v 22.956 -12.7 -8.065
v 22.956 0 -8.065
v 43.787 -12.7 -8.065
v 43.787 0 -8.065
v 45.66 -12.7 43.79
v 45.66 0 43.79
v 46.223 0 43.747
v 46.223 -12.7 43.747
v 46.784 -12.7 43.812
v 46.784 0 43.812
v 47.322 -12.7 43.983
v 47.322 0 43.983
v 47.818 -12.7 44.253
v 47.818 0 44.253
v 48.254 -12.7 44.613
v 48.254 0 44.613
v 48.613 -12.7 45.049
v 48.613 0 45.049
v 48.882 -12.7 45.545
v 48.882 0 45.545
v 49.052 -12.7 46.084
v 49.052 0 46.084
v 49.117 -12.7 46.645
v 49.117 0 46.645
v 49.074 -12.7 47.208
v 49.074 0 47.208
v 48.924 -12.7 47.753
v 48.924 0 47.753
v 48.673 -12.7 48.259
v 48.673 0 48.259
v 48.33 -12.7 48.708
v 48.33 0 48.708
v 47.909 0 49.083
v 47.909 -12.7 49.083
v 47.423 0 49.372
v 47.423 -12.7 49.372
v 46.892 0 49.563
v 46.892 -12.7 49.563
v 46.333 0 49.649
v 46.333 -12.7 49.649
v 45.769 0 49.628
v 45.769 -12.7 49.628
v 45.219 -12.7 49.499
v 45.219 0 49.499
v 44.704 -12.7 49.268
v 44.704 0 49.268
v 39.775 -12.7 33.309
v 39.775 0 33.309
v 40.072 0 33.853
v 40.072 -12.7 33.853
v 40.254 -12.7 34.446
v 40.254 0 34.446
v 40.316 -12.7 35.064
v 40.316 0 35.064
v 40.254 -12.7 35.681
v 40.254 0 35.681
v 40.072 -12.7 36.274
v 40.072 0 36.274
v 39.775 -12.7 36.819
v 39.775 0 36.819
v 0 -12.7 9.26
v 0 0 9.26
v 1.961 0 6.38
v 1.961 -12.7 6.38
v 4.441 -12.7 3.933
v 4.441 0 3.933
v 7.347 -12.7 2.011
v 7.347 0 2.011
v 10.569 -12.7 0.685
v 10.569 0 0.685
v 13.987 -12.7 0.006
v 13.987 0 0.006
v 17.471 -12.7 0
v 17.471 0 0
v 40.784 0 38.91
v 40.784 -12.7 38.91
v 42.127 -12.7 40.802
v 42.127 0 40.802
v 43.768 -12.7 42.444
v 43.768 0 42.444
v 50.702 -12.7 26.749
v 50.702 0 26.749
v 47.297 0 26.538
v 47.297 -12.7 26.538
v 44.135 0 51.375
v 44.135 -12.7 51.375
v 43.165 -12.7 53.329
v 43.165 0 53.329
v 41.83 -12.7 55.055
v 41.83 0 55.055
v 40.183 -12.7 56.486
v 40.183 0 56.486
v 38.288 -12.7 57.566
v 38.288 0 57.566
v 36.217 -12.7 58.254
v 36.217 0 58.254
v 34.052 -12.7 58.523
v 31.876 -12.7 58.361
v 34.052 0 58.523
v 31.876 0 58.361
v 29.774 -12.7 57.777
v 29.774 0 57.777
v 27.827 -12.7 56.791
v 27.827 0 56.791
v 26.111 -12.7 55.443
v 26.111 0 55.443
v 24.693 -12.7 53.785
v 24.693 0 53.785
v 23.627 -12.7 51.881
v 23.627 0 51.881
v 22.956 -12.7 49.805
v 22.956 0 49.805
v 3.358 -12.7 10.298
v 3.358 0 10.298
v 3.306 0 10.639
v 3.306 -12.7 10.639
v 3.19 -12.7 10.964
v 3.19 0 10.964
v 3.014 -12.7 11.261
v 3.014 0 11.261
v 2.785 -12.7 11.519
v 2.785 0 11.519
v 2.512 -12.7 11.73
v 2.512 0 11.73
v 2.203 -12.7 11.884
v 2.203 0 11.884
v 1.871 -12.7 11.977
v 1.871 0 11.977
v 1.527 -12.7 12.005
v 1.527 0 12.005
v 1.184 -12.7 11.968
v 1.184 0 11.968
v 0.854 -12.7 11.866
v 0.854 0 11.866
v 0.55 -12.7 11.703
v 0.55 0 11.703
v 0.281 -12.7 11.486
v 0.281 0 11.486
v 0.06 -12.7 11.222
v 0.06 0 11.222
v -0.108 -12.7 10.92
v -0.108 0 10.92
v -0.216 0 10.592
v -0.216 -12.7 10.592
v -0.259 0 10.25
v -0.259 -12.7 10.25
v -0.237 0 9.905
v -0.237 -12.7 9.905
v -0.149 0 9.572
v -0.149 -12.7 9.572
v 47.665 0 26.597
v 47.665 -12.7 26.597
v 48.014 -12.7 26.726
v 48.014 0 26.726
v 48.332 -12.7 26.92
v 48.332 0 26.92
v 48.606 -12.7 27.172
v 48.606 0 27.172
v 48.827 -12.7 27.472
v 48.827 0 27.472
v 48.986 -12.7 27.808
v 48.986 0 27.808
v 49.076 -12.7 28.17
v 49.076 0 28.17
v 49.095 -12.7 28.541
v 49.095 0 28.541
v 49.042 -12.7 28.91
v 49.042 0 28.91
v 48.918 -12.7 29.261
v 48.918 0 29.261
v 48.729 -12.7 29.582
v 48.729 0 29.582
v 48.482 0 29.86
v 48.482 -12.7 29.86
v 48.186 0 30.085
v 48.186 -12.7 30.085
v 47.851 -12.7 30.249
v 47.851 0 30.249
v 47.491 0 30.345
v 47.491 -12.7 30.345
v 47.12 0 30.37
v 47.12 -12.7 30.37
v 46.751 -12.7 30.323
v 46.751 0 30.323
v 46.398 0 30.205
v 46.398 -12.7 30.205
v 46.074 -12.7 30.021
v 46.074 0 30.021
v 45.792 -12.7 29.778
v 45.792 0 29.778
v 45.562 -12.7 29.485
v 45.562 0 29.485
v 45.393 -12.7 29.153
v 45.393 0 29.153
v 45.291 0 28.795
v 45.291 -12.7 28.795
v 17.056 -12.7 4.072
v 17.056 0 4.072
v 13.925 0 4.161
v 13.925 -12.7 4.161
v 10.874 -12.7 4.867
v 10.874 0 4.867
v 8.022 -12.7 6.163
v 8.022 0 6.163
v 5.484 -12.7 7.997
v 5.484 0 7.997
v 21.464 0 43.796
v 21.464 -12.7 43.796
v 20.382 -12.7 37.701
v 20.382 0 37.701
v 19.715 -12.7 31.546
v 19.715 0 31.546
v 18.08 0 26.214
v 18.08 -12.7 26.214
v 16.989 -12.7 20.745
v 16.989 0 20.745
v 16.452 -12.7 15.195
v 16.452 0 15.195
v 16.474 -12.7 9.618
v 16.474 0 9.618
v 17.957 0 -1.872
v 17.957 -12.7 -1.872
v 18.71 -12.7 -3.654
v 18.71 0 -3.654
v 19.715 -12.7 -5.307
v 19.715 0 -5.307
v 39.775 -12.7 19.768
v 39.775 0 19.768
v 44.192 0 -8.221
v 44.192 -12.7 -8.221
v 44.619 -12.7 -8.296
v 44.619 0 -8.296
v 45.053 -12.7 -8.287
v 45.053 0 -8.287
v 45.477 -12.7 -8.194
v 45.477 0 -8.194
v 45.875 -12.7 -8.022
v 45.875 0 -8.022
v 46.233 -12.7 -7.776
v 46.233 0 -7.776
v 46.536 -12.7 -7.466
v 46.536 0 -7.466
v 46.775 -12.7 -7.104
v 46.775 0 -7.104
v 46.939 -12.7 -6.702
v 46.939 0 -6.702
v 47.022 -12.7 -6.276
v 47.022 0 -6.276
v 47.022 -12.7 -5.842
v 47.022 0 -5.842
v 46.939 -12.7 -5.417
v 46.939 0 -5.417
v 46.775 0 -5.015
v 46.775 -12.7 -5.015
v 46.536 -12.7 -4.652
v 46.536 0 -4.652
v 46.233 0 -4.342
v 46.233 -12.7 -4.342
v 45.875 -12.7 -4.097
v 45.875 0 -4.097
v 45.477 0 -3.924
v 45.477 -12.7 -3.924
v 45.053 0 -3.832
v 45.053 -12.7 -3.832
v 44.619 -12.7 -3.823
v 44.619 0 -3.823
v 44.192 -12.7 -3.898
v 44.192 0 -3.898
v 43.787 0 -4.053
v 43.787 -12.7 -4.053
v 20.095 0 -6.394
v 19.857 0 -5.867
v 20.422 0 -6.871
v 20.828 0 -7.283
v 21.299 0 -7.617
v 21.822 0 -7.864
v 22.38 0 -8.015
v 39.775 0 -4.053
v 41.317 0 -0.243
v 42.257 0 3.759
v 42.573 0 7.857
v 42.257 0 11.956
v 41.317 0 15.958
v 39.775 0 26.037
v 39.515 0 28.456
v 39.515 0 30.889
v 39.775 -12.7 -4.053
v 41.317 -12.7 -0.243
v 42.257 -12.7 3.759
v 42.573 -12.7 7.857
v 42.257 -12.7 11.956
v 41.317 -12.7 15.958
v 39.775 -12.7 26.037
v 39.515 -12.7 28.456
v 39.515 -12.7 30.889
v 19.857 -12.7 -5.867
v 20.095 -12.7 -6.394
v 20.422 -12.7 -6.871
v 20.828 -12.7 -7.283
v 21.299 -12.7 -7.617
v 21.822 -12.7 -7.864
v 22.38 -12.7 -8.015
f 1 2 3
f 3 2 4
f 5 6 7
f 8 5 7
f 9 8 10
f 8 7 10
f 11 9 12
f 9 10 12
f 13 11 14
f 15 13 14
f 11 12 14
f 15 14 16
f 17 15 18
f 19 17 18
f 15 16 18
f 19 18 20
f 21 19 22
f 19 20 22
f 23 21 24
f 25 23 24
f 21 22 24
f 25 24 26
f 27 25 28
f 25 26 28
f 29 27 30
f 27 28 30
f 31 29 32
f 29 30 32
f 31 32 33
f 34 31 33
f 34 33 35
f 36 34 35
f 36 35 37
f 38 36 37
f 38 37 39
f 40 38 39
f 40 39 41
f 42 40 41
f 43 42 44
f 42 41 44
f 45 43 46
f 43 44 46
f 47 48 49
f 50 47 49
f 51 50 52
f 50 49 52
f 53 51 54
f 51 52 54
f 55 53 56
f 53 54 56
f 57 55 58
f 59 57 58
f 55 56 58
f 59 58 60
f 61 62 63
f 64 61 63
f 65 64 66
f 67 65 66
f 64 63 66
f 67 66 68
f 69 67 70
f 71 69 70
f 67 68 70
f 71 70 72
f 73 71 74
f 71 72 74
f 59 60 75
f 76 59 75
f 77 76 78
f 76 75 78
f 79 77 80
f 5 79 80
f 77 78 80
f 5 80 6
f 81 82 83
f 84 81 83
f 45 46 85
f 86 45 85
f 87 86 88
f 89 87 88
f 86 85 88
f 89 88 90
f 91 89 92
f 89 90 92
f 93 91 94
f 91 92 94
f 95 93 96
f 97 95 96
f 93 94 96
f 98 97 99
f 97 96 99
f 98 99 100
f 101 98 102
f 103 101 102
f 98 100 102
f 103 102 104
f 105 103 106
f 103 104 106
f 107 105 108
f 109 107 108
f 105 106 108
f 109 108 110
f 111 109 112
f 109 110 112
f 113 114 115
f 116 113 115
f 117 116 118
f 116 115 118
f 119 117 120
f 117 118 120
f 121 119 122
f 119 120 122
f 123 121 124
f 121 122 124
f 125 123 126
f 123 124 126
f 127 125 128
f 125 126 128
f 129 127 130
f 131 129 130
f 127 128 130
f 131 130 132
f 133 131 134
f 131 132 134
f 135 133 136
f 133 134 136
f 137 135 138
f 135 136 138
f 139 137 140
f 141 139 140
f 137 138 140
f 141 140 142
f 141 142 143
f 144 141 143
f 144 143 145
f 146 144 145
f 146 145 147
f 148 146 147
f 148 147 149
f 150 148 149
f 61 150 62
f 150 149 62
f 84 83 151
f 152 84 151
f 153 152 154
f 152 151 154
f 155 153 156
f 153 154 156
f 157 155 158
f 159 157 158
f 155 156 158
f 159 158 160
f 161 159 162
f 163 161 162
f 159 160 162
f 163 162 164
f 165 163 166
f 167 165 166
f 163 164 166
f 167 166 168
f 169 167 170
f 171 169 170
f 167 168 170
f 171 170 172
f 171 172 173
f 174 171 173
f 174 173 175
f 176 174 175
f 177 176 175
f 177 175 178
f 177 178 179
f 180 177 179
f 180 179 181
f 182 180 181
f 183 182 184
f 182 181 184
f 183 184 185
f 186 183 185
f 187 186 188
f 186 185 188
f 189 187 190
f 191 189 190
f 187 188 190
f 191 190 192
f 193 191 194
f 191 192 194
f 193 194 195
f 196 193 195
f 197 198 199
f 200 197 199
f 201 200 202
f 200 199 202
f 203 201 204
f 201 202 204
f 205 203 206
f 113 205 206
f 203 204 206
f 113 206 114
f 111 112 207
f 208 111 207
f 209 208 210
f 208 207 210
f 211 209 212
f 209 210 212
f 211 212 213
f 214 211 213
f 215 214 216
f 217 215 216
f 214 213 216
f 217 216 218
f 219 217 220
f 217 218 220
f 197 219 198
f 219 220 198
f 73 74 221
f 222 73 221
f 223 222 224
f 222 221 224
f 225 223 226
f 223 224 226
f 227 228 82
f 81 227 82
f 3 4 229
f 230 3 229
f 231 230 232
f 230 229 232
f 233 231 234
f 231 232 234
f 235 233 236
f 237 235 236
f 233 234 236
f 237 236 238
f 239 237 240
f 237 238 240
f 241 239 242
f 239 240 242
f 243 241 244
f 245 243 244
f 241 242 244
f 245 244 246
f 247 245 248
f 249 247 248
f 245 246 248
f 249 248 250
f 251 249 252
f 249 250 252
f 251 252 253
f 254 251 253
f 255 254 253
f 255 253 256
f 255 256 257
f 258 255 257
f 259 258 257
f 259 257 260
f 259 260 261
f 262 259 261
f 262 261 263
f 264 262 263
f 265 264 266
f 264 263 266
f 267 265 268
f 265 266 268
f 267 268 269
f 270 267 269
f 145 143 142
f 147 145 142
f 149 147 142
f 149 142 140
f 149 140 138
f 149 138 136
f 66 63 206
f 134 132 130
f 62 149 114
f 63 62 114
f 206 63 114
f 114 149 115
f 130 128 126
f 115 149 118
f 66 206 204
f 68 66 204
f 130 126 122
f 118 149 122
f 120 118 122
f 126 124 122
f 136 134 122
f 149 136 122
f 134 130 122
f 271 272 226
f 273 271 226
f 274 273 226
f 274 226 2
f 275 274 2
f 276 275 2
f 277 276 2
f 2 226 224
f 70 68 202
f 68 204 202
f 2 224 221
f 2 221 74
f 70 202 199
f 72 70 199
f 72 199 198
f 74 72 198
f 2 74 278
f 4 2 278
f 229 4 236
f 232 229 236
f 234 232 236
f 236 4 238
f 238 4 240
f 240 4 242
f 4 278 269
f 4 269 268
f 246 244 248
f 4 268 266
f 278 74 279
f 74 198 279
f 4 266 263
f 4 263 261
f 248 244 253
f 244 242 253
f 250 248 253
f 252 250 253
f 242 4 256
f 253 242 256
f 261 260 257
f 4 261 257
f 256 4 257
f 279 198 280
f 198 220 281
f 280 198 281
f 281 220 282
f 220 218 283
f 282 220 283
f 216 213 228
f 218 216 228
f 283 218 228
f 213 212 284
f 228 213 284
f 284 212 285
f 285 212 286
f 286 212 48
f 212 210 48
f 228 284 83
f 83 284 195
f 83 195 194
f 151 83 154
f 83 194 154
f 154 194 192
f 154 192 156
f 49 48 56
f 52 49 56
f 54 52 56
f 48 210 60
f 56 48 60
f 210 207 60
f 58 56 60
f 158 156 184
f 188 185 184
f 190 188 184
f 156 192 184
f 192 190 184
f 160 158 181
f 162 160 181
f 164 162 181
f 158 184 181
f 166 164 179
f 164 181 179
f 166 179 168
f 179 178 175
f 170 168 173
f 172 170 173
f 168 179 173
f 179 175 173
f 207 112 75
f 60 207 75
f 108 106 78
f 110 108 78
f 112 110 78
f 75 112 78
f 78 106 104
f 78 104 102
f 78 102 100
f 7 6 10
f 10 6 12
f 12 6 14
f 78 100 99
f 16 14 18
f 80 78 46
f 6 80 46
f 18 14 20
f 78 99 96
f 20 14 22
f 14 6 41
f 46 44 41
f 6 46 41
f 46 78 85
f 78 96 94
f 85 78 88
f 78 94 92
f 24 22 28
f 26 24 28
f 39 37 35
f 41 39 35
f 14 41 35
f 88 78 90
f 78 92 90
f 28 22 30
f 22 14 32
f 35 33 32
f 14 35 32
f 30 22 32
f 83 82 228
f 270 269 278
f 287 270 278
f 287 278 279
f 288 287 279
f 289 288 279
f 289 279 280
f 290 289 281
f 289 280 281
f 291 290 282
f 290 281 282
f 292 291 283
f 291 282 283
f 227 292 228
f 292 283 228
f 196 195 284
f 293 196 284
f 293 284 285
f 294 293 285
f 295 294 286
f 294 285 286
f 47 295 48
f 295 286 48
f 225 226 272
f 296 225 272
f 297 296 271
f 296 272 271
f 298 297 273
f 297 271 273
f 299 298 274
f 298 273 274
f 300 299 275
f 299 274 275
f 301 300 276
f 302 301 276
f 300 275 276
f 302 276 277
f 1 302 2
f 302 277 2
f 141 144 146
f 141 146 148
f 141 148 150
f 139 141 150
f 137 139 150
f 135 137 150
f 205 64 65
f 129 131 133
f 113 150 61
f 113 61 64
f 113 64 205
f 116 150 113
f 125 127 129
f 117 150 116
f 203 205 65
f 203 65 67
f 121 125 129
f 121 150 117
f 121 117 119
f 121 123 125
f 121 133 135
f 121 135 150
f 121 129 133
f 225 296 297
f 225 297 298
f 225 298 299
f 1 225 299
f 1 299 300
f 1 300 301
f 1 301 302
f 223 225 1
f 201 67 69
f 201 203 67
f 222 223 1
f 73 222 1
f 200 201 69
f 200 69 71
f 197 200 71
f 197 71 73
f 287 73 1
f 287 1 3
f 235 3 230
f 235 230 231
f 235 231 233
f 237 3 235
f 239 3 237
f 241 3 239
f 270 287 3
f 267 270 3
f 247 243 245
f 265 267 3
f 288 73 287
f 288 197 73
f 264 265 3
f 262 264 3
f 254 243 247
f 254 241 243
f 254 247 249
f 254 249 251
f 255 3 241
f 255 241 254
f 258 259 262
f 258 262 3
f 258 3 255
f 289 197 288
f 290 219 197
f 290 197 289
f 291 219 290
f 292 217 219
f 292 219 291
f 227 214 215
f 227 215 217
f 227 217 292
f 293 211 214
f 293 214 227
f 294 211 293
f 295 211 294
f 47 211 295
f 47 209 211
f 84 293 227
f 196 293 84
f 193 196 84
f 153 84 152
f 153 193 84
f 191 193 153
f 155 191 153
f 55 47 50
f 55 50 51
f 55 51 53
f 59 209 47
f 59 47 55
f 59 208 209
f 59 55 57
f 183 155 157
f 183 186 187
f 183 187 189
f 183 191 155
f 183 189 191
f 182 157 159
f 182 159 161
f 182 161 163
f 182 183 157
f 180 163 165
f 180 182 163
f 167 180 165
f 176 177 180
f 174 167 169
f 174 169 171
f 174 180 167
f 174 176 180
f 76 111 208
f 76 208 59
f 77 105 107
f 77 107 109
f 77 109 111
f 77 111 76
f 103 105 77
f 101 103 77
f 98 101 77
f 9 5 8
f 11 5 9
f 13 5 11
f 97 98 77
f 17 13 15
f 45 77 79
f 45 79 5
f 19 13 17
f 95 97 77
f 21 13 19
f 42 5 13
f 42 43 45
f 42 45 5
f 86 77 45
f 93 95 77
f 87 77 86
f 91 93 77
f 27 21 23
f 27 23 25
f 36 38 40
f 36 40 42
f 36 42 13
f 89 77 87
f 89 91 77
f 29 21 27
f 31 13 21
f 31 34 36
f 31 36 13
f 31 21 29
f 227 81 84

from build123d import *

# Parameters (mm, degrees)
F1_DEPTH = 12.7


with BuildPart() as f1:
    # F0 (on Front) → F1 (new body)
    with BuildSketch(Plane.XZ):
        with BuildLine():
            ThreePointArc((45.659669, 43.789603), (49.07354, 47.207987), (44.703573, 49.267903))
            ThreePointArc((44.703573, 49.267903), (34.051612, 58.522614), (22.955889, 49.804881))
            ThreePointArc((22.955889, 49.804881), (20.871145, 40.757723), (19.714734, 31.545777))
            ThreePointArc((19.714734, 31.545777), (16.650538, 17.976794), (17.055664, 4.072029))
            ThreePointArc((17.055664, 4.072029), (9.415581, 5.443728), (3.358493, 10.298016))
            ThreePointArc((3.358493, 10.298016), (1.016335, 11.924756), (0, 9.260352))
            ThreePointArc((0, 9.260352), (7.346914, 2.010702), (17.47073, 0))
            ThreePointArc((17.47073, 0), (18.301019, -2.776931), (19.714734, -5.307176))
            ThreePointArc((19.714734, -5.307176), (20.827914, -7.282535), (22.955889, -8.06544))
            Line((22.955889, -8.06544), (39.524082, -8.06544))
            Line((39.524082, -8.06544), (43.786854, -8.06544))
            ThreePointArc((43.786854, -8.06544), (47.032645, -6.05943), (43.786854, -4.053419))
            Line((43.786854, -4.053419), (39.774835, -4.053419))
            ThreePointArc((39.774835, -4.053419), (42.573385, 7.857265), (39.774835, 19.767949))
            Line((39.774835, 19.767949), (50.701622, 26.749119))
            Line((50.701622, 26.749119), (47.29737, 26.538234))
            ThreePointArc((47.29737, 26.538234), (48.612442, 29.727127), (45.29136, 28.794995))
            Line((45.29136, 28.794995), (39.774835, 26.03673))
            ThreePointArc((39.774835, 26.03673), (39.482213, 29.672624), (39.774835, 33.308517))
            ThreePointArc((39.774835, 33.308517), (40.316203, 35.063775), (39.774835, 36.819033))
            ThreePointArc((39.774835, 36.819033), (42.127254, 40.802418), (45.659669, 43.789603))
        make_face()
    extrude(amount=F1_DEPTH)


solid = f1.part
